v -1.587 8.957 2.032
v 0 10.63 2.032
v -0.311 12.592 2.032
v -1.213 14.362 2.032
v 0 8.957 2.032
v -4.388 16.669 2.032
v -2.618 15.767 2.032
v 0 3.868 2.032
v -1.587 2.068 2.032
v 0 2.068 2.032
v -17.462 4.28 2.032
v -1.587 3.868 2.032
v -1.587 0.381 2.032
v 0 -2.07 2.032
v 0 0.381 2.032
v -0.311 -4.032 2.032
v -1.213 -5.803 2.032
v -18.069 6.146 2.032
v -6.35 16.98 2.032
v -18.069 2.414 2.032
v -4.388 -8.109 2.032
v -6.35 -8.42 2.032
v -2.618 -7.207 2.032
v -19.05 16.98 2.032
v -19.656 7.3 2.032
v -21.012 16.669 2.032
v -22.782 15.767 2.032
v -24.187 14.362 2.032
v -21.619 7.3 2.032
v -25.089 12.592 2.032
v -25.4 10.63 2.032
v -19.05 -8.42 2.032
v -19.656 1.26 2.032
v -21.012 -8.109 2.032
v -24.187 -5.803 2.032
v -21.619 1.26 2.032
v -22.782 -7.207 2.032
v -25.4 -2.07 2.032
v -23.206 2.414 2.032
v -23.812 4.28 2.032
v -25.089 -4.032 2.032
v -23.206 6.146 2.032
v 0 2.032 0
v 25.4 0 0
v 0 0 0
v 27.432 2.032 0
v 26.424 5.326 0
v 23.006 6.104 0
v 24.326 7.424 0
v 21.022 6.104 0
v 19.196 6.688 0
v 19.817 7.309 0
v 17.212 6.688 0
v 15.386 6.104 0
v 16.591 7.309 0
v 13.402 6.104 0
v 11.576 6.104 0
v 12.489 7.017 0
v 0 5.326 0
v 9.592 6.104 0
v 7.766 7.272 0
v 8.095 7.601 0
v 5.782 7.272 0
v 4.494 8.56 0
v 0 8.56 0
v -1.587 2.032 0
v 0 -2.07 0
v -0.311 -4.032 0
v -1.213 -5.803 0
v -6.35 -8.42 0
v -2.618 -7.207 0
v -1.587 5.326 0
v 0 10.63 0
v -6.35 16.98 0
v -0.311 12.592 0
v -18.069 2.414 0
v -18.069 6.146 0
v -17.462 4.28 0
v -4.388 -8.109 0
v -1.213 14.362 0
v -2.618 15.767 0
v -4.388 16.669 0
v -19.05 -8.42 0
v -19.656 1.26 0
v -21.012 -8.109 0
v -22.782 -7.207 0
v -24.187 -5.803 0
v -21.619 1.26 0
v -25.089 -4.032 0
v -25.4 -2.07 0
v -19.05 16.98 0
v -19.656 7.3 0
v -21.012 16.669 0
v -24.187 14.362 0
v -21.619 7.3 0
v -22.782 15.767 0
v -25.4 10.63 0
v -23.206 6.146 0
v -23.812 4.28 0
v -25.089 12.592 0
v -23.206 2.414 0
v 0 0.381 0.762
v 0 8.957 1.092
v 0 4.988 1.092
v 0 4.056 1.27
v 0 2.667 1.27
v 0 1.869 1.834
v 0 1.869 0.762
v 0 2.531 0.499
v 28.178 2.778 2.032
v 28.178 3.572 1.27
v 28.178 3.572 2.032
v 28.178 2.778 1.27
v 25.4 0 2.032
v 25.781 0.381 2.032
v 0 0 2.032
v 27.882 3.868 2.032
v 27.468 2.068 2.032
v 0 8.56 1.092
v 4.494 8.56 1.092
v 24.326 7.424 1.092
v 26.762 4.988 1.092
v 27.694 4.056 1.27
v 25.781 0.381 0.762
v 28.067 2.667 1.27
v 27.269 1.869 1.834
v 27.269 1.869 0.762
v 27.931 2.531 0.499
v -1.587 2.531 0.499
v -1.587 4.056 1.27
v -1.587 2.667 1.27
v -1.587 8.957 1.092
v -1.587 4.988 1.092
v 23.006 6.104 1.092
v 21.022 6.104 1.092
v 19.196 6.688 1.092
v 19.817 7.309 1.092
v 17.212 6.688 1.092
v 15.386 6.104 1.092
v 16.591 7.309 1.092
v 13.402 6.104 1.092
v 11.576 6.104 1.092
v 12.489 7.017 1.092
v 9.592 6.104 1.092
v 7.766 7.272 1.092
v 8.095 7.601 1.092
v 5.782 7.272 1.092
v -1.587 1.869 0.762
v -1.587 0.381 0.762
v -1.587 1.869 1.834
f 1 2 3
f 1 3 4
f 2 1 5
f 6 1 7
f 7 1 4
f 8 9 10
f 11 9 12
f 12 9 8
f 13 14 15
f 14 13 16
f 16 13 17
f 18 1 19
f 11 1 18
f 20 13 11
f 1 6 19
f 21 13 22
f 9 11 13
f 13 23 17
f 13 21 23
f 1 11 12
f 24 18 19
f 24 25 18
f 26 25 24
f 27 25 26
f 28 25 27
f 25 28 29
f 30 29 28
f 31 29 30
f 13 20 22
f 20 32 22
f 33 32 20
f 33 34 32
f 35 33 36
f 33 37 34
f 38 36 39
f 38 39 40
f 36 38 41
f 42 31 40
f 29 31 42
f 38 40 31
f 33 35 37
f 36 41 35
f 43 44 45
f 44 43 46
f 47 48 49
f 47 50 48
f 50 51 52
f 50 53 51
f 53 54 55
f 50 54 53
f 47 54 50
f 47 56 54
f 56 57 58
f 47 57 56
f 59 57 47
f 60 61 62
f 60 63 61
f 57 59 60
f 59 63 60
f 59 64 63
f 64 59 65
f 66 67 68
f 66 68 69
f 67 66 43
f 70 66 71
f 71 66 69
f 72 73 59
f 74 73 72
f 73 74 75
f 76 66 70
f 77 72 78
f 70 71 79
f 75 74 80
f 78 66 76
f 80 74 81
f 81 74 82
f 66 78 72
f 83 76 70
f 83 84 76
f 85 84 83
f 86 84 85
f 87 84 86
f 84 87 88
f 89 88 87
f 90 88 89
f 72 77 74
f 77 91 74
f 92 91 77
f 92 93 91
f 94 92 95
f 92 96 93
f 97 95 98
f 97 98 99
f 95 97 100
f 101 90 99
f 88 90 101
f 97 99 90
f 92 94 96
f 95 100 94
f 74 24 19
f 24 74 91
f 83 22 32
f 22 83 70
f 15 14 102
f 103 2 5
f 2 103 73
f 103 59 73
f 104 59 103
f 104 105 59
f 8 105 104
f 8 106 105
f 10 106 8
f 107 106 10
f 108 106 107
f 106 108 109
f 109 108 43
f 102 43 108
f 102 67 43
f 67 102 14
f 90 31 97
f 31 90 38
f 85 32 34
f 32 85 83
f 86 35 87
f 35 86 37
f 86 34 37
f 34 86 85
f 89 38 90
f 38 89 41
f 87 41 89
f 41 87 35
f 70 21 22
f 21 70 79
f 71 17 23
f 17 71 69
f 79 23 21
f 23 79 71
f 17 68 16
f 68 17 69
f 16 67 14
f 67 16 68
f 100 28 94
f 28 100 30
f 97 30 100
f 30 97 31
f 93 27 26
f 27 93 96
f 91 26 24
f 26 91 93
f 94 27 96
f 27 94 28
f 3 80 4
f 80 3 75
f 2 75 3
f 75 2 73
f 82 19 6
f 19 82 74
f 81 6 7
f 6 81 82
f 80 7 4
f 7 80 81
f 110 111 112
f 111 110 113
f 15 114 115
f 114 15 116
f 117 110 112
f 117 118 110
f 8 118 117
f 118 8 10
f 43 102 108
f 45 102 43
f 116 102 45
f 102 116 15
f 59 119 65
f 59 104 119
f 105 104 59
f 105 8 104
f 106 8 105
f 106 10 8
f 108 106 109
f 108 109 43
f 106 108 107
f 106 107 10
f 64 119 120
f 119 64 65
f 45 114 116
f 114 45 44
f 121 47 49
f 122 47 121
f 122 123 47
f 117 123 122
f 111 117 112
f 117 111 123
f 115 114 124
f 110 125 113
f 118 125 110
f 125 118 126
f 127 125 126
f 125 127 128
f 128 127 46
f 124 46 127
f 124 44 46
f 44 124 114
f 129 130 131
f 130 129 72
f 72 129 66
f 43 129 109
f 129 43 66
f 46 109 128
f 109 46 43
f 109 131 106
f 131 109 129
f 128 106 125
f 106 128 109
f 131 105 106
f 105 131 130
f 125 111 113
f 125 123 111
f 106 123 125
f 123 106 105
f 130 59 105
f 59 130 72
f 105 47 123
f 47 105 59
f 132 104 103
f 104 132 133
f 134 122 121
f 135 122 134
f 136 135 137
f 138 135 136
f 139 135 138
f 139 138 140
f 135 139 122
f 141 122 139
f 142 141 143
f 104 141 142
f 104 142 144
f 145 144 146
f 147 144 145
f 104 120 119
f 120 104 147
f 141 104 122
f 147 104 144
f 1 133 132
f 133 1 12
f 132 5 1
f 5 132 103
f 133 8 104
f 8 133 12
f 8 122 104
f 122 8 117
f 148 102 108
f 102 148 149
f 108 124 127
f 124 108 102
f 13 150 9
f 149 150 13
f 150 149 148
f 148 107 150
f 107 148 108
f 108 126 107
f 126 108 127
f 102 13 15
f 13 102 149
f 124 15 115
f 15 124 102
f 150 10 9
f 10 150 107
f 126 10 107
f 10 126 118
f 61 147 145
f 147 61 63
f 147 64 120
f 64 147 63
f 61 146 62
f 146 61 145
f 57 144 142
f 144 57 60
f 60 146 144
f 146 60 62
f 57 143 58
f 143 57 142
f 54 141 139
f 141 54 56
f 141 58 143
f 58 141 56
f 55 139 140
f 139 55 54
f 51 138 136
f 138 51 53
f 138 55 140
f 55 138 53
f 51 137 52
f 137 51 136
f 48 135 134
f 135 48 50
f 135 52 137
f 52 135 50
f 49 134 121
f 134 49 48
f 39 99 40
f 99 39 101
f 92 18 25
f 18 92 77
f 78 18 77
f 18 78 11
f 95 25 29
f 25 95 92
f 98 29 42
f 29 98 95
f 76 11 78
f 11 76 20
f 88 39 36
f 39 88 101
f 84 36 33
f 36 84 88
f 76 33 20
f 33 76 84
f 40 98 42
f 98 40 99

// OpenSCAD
// Physical Keygen - by Nirav Patel <http://eclecti.cc>
//
// Generate a duplicate of a Kwikset KW1 key by editing the last line of the file
// and entering in the key code of the lock.  If you don't know the key code,
// you can measure the key and compare the numbers at:
// http://web.archive.org/web/20050217020917fw_/http://dlaco.com/spacing/tips.htm
//
// This work is licensed under a Creative Commons Attribution 3.0 Unported License.

// Since the keys and locks I have were all designed in imperial units, the
// constants in this file will be defined in inches.  The mm function
// allows us to retain the proper size for exporting a metric STL.
function mm(i) = i*25.4;

module rounded(size, r) {
    union() {
        translate([r, 0, 0]) cube([size[0]-2*r, size[1], size[2]]);
        translate([0, r, 0]) cube([size[0], size[1]-2*r, size[2]]);
        translate([r, r, 0]) cylinder(h=size[2], r=r);
        translate([size[0]-r, r, 0]) cylinder(h=size[2], r=r);
        translate([r, size[1]-r, 0]) cylinder(h=size[2], r=r);
        translate([size[0]-r, size[1]-r, 0]) cylinder(h=size[2], r=r);
    }
}

module bit() {
    w = mm(1/4);
    difference() {
        translate([-w/2, 0, 0]) cube([w, mm(1), w]);
        translate([-mm(5/128), 0, 0]) rotate([0, 0, 135]) cube([w, w, w]);
        translate([mm(5/128), 0, 0]) rotate([0, 0, -45]) cube([w, w, w]);
    }
}

// Kwikset KW1 5 pin key.  The measurements are mostly guesses based on reverse
// engineering some keys I have and some publicly available information.
module kw1(bits) {
    // You may need to adjust these to fit your specific printer settings
    thickness = mm(0.080);
    length = mm(9/8);
    width = mm(.337);
    
    shoulder = mm(.247);
    pin_spacing = mm(.15);
    depth_inc = mm(.023);
    
    // A fudge factor.  Printing with your average RepRap, the bottom layer is
    // going to be squeezed larger than you want. You can make the pins
    // go slighly deeper by a fudge amount to make up for it if you aren't
    // adjusting for it elsewhere like Skeinforge or in your firmware.
    fudge = 0.5;
    
    // Handle size
    h_l = mm(1);
    h_w = mm(1);
    h_d = mm(1/16);
    difference() {
        // blade and key handle
        union() {
            translate([-h_l, -h_w/2 + width/2, 0]) rounded([h_l, h_w, thickness], mm(1/4));
            // cut a little off the tip to avoid going too long
            cube([length - mm(1/64), width, thickness]);
        }
        
        // chamfer the tip
        translate([length, mm(1/8), 0]) {
            rotate([0, 0, 45]) cube([10, 10, thickness]);
            rotate([0, 0, 225]) cube([10, 10, thickness]);
        }
        
        // put in a hole for keychain use
        translate([-h_l + mm(3/16), width/2, 0]) cylinder(h=thickness, r=mm(1/8));
        
        // cut the channels in the key.  designed more for printability than accuracy
        union() {
            translate([-h_d, mm(.105), mm(.025)]) rotate([225, 0, 0]) cube([length + h_d, width, width]);
            translate([-h_d, mm(.105), mm(.05)]) rotate([260, 0, 0]) cube([length + h_d, thickness/2, mm(1/32)]);
            translate([-h_d, mm(.105), 0]) cube([length + h_d, mm(7/128), mm(.05)]);
            translate([-h_d, mm(.105) + mm(7/128), mm(.05)]) rotate([225, 0, 0]) cube([length + h_d, mm(3/64), thickness]);
        }
        
        translate([-h_d, width - mm(9/64), mm(.043)]) {
            cube([length + h_d, width - (width - mm(10/64)), thickness]);
            rotate([50, 0, 0]) cube([length + h_d, width, thickness]);
        }
        
        union() {
            translate([-h_d, mm(0.015), mm(.03)]) cube([length + h_d, mm(15/256), thickness]);
            translate([-h_d, mm(0.015) + mm(13/256), thickness - mm(1/64)]) rotate([45, 0, 0]) cube([length + h_d, mm(1/16), mm(1/16)]);
        }
        
        // Do the actual bitting
        for (b = [0:4]) {
            // KW1 doesn't have a 0 value and instead has 1 start around .008" deep
            translate([shoulder + fudge + b*pin_spacing, width - mm(.008) - (bits[b] - 1)*depth_inc - fudge, 0]) bit();
        }
    }
}

// This sample key goes to a lock that is sitting disassembled on my desk
// Flip the key over for easy printing
kw1([2,4,4,3,4]);
